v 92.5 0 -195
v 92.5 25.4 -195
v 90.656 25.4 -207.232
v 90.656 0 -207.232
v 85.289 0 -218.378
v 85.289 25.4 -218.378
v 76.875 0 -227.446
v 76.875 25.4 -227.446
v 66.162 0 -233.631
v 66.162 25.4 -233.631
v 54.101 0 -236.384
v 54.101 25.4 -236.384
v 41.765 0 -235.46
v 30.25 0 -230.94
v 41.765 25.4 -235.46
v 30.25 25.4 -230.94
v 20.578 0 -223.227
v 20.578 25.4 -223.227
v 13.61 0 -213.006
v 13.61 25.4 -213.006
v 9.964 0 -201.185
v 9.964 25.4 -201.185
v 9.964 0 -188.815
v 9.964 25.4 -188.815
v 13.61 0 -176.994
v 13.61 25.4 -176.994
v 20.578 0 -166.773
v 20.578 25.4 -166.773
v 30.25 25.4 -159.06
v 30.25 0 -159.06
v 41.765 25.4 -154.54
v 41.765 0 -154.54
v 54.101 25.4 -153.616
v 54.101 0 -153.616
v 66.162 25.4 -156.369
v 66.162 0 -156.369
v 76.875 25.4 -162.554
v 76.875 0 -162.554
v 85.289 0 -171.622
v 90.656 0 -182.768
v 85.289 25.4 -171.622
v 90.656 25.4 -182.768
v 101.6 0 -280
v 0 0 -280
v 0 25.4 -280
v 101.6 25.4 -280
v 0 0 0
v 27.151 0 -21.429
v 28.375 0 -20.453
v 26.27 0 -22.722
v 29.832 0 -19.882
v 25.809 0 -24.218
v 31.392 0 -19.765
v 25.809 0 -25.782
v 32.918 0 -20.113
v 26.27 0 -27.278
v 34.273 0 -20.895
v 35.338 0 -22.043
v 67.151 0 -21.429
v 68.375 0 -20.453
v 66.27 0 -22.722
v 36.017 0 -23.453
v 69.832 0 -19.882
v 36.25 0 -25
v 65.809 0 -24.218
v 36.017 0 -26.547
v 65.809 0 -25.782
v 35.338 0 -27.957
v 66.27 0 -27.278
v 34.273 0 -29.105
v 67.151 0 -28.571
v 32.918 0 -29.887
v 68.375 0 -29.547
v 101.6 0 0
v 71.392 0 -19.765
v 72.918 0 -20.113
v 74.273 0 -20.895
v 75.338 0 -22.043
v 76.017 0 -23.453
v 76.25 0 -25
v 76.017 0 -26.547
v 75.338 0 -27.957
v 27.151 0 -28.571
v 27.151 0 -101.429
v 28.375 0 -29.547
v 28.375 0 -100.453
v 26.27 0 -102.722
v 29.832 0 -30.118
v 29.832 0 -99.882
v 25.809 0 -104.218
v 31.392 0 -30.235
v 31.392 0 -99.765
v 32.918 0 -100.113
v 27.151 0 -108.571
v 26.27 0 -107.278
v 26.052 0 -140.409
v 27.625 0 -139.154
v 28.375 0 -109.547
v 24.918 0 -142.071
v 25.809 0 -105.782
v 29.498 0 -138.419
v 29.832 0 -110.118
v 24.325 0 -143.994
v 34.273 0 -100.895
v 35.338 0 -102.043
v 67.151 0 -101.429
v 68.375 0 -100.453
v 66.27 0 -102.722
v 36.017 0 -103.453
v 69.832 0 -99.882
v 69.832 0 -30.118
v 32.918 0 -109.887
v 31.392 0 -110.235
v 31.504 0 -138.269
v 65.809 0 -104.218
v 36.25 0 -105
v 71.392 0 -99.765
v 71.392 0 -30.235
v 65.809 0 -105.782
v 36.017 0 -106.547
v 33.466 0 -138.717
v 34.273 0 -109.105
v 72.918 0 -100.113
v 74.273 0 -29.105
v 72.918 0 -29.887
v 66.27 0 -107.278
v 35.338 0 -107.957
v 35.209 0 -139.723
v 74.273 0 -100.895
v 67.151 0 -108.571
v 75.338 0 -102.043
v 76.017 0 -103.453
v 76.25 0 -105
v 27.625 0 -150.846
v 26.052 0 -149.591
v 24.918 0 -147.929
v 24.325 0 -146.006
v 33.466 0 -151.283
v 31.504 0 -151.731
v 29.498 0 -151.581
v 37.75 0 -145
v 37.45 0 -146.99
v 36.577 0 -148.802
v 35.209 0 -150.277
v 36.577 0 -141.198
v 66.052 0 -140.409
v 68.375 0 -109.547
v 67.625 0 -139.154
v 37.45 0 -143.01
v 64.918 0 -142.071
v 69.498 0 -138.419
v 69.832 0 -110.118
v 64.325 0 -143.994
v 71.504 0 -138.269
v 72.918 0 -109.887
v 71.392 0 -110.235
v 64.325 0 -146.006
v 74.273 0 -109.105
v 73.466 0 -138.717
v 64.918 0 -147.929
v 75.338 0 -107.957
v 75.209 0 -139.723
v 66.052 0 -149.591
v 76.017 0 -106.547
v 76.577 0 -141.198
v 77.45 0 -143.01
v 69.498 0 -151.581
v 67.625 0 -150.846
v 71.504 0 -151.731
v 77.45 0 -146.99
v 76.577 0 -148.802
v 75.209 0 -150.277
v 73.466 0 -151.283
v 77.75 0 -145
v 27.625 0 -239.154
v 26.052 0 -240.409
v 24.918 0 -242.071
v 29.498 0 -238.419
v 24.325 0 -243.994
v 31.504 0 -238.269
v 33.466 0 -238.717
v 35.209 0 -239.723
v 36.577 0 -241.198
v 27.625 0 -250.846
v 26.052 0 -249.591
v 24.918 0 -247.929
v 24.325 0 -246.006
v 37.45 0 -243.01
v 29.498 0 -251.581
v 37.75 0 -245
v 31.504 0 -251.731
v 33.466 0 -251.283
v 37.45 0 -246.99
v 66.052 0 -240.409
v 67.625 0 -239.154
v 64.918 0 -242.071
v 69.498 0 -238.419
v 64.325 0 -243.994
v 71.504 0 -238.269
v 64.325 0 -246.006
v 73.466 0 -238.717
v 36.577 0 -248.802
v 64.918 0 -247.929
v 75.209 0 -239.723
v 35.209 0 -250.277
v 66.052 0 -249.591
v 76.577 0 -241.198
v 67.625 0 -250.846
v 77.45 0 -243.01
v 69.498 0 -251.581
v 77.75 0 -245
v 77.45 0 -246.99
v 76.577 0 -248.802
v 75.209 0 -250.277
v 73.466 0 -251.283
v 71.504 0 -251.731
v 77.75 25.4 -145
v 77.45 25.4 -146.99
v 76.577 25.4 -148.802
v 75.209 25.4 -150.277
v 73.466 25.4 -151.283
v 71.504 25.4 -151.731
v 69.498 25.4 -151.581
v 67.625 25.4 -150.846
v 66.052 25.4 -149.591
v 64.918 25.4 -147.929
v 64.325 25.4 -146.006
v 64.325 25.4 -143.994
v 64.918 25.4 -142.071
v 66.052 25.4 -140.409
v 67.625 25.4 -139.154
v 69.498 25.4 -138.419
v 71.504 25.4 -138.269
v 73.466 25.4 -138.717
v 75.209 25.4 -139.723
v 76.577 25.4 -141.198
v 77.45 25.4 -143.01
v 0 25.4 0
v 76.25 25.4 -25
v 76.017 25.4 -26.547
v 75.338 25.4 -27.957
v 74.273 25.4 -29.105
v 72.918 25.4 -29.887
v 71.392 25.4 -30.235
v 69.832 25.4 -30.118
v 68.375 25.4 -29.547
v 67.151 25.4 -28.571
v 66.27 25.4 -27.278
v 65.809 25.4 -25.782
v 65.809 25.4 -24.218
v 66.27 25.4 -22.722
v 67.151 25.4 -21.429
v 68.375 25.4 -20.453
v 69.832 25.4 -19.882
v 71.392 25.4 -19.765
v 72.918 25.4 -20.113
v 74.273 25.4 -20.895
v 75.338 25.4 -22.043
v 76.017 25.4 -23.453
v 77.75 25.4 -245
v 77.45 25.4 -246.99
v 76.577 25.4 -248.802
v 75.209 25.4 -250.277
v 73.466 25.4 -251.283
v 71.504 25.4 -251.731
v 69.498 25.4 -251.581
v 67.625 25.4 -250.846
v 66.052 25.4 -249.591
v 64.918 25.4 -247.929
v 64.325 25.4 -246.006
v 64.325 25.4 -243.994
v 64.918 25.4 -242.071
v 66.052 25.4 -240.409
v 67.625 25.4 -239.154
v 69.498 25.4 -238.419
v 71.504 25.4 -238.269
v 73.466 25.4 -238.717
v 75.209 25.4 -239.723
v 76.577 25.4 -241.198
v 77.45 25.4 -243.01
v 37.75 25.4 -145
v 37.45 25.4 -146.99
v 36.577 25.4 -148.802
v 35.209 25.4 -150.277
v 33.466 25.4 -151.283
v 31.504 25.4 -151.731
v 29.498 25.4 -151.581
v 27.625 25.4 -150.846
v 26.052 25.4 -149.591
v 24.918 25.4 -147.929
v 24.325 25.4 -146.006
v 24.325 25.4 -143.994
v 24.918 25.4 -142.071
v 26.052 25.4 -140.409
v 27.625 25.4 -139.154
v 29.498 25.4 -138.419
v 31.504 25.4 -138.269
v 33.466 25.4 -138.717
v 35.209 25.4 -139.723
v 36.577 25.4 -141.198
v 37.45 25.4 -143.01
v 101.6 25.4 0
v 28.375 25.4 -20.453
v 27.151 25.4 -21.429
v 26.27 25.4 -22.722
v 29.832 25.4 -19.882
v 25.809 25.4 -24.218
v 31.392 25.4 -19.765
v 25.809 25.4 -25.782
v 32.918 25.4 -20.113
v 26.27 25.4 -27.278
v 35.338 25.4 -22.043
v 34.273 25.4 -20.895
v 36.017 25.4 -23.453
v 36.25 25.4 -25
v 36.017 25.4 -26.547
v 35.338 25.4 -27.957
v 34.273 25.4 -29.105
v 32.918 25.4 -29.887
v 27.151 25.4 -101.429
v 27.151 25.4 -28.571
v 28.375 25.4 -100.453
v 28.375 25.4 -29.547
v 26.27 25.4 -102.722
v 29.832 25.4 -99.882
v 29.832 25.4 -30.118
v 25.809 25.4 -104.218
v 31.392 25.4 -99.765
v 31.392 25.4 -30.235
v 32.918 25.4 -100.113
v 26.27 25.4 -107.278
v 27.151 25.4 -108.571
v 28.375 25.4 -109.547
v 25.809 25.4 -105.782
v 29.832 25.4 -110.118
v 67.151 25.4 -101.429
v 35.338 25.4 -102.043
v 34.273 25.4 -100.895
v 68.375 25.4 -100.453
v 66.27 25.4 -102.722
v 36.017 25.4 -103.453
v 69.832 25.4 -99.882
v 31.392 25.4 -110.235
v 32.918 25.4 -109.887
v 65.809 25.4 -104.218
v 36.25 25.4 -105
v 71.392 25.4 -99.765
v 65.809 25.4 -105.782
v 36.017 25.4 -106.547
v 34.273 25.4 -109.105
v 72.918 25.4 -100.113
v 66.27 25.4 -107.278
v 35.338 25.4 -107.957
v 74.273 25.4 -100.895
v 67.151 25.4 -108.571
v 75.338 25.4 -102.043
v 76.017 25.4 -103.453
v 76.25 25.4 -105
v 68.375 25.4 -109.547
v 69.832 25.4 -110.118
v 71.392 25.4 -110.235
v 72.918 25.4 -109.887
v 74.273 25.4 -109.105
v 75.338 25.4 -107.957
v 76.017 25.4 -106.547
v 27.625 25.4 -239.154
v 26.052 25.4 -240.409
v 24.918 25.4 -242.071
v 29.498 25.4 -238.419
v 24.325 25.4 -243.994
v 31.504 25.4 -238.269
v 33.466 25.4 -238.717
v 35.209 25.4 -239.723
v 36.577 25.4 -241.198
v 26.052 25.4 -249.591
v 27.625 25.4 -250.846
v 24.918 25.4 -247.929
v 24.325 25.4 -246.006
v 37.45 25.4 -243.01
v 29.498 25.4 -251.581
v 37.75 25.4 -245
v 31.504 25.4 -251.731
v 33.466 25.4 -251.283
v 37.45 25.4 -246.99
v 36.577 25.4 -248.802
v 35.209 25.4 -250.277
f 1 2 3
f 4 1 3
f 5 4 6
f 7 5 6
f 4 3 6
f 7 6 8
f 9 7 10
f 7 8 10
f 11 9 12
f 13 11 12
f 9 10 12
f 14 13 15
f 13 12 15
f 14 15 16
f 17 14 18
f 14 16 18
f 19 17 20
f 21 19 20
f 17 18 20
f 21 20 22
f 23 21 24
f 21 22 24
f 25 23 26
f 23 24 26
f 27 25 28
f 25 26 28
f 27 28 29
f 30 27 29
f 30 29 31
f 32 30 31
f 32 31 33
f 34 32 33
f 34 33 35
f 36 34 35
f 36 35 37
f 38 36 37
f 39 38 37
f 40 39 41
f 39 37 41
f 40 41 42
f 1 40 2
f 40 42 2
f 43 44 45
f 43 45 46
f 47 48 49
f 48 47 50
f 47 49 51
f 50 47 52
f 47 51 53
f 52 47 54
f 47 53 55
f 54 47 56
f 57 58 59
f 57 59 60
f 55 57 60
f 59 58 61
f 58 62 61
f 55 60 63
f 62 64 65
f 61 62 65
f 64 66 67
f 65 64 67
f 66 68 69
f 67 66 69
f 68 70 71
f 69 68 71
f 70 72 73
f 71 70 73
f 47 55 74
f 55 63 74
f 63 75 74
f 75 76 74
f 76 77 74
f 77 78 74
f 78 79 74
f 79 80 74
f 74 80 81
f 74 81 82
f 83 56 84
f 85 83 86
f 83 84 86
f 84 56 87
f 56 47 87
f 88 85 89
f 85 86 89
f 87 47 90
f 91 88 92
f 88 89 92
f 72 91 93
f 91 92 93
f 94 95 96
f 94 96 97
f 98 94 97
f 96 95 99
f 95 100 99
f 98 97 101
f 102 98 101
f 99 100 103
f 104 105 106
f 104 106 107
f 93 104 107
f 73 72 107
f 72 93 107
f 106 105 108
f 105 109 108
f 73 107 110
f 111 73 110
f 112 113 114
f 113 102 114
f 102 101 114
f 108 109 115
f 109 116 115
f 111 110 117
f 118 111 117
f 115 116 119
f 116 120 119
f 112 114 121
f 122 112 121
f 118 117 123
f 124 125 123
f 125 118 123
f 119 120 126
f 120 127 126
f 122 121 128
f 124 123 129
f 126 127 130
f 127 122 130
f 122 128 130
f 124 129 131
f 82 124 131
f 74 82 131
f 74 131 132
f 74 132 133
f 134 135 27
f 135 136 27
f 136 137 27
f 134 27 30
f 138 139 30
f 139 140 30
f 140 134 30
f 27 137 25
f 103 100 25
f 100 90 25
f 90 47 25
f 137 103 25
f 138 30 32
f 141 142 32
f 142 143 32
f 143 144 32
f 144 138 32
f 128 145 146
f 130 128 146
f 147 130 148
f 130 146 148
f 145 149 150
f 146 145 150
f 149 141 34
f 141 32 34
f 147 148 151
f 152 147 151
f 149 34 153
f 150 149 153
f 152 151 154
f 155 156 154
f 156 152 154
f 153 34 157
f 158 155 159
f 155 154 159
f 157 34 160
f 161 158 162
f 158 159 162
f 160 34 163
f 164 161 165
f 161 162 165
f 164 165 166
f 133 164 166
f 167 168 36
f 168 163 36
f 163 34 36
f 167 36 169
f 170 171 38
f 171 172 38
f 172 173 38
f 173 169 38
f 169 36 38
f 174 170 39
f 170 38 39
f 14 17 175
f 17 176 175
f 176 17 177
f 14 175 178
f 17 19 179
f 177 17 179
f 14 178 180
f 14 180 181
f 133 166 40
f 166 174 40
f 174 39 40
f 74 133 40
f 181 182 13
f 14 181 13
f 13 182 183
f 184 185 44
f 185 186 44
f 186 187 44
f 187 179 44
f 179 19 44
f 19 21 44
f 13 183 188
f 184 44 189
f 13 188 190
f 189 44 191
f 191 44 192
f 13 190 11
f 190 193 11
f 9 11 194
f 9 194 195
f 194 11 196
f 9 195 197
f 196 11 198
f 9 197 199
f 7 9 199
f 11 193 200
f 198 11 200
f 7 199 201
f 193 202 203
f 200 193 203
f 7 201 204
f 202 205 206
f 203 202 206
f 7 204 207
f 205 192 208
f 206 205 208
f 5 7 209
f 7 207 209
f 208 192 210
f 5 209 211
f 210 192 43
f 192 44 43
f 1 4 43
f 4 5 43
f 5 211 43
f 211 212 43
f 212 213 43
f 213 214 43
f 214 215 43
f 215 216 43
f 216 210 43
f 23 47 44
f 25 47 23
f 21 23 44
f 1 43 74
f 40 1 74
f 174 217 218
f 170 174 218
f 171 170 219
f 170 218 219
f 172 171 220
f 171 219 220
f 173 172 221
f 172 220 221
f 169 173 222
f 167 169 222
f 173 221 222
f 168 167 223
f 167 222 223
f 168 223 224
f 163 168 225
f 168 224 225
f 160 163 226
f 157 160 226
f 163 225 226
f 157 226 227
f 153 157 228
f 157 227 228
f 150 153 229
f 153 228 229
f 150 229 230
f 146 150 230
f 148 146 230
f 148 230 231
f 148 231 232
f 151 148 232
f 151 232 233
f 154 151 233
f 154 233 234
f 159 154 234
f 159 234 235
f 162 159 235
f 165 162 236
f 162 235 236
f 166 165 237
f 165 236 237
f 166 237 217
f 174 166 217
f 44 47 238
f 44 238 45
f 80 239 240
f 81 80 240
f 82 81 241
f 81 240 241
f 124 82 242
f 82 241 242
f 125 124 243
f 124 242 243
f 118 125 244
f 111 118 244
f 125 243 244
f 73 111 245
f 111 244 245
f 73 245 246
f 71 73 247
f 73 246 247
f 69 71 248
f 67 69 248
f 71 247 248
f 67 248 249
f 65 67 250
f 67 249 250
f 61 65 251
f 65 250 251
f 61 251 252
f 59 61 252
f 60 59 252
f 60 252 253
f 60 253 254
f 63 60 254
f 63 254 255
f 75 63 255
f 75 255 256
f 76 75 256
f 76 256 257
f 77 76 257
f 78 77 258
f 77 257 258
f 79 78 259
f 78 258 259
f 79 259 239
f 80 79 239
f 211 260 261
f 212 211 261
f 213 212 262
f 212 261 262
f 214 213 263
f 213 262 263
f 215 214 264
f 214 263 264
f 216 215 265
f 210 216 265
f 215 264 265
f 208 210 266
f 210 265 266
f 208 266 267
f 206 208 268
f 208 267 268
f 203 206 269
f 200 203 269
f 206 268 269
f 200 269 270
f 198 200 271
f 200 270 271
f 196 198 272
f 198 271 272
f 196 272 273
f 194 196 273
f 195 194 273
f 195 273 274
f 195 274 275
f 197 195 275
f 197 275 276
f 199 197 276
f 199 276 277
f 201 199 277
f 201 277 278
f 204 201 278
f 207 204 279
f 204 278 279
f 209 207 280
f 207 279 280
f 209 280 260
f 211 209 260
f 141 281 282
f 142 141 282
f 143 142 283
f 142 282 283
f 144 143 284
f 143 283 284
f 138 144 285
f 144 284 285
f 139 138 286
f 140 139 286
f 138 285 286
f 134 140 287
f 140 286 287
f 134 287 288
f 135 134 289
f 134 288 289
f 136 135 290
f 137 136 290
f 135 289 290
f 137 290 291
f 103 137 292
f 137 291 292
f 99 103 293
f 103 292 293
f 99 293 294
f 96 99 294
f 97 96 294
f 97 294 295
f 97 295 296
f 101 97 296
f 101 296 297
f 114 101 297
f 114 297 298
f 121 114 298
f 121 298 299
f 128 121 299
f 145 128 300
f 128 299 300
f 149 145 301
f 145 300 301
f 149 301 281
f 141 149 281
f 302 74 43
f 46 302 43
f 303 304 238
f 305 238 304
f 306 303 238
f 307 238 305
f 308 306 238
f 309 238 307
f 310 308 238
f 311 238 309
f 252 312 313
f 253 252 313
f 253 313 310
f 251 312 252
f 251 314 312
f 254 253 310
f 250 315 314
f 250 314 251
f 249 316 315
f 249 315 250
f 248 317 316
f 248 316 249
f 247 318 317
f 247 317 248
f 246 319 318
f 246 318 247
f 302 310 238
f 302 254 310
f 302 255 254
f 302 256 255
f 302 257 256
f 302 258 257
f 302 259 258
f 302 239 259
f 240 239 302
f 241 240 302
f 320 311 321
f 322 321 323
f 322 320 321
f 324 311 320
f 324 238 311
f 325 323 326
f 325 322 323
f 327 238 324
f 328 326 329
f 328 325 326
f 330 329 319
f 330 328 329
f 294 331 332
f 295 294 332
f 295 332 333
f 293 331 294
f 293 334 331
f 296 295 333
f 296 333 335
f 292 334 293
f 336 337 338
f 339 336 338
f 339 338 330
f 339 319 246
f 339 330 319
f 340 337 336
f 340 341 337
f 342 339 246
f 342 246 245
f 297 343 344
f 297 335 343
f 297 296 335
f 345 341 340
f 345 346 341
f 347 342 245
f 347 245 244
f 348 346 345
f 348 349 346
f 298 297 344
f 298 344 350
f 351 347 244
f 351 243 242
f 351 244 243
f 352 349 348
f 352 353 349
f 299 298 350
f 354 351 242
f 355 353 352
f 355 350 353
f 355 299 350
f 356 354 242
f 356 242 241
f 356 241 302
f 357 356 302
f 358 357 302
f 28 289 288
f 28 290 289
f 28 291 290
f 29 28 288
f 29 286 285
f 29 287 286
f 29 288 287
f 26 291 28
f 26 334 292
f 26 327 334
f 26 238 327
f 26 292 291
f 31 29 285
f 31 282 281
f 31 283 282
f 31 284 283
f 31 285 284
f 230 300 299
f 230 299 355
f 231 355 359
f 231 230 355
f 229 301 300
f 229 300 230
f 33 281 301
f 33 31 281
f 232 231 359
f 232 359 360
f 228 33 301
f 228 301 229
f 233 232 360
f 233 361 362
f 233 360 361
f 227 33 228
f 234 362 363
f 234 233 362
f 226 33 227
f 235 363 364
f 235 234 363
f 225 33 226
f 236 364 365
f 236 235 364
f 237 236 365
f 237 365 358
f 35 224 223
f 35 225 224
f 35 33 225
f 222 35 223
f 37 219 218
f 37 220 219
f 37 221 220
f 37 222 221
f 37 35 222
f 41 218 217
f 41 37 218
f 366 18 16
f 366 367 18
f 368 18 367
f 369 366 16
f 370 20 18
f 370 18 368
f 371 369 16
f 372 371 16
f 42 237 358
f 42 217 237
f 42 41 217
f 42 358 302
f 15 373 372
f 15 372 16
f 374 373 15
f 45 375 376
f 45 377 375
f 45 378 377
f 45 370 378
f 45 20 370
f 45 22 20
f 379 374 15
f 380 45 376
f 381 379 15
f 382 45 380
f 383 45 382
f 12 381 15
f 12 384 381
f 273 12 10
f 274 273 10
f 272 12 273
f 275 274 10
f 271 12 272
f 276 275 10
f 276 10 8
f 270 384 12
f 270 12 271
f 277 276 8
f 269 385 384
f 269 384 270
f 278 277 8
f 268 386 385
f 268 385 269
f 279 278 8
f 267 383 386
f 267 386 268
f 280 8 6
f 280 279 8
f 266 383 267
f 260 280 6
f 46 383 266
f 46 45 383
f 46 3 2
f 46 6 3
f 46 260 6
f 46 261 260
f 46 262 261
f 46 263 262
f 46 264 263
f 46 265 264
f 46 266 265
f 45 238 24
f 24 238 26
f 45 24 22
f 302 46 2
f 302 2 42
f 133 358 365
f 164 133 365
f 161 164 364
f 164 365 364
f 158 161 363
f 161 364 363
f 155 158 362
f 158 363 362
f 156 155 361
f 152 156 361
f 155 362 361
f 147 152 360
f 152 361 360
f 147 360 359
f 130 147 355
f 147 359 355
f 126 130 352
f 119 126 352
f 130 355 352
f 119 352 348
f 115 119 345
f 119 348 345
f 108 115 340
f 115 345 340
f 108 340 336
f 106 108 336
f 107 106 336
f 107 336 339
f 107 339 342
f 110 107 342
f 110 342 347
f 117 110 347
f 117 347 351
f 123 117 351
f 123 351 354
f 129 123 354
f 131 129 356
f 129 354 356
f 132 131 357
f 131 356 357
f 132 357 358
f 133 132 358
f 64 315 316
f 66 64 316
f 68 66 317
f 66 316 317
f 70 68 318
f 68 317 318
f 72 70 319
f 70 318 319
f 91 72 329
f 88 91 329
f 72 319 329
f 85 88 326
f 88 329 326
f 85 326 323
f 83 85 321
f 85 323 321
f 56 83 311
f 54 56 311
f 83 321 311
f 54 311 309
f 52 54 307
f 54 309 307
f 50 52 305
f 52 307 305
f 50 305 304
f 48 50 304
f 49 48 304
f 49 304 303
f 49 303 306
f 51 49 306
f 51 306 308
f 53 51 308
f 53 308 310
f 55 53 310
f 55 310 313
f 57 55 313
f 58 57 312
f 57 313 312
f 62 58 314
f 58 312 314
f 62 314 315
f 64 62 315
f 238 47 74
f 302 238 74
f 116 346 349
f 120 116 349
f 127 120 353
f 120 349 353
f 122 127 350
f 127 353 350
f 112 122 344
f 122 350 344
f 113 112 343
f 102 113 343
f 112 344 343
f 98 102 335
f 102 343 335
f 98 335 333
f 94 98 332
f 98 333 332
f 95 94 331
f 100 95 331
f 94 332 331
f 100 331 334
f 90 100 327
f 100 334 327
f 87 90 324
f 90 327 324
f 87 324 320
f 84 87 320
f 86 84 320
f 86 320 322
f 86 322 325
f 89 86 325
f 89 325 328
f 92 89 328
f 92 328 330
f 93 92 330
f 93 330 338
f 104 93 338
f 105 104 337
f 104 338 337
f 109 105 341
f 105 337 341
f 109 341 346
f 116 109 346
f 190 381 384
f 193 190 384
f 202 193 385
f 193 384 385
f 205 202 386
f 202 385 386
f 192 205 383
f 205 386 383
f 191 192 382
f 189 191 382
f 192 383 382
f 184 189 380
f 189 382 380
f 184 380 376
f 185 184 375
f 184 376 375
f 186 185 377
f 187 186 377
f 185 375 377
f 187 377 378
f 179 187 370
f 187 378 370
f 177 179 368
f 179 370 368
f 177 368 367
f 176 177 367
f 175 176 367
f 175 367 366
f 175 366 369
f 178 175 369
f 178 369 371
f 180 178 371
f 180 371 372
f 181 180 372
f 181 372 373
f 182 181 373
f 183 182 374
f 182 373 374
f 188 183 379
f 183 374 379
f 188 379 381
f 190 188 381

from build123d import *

# Parameters (mm, degrees)
SKETCH2_W           = 101.6
SKETCH2_H           = 280
BOSS_EXTRUDE1_DEPTH = 25.4
SKETCH3_R           = 6.75
SKETCH3_R_2         = 41.5
CUT_EXTRUDE1_DEPTH  = 25.4
SKETCH4_R           = 5.25
CUT_EXTRUDE2_DEPTH  = 25.4


with BuildPart() as part:
    # Sketch2 → Boss-Extrude1 (new body)
    with BuildSketch(Plane(origin=(0, 0, 0), x_dir=(1, 0, 0), z_dir=(0, 1, 0))):
        with Locations((50.8, 140)):
            Rectangle(SKETCH2_W, SKETCH2_H)
    extrude(amount=BOSS_EXTRUDE1_DEPTH)

    # Sketch3 → Cut-Extrude1 (cut)
    with BuildSketch(Plane(origin=(0, 25.4, 0), x_dir=(1, 0, 0), z_dir=(0, 1, 0))):
        with Locations((71, 245)):
            Circle(SKETCH3_R)
        with Locations((31, 245)):
            Circle(SKETCH3_R)
        with Locations((71, 145)):
            Circle(SKETCH3_R)
        with Locations((31, 145)):
            Circle(SKETCH3_R)
        with Locations((51, 195)):
            Circle(SKETCH3_R_2)
    extrude(amount=-CUT_EXTRUDE1_DEPTH, mode=Mode.SUBTRACT)

    # Sketch4 → Cut-Extrude2 (cut)
    with BuildSketch(Plane(origin=(0, 25.4, 0), x_dir=(1, 0, 0), z_dir=(0, 1, 0))):
        with Locations((71, 105)):
            Circle(SKETCH4_R)
        with Locations((31, 105)):
            Circle(SKETCH4_R)
        with Locations((31, 25)):
            Circle(SKETCH4_R)
        with Locations((71, 25)):
            Circle(SKETCH4_R)
    extrude(amount=-CUT_EXTRUDE2_DEPTH, mode=Mode.SUBTRACT)


solid = part.part
